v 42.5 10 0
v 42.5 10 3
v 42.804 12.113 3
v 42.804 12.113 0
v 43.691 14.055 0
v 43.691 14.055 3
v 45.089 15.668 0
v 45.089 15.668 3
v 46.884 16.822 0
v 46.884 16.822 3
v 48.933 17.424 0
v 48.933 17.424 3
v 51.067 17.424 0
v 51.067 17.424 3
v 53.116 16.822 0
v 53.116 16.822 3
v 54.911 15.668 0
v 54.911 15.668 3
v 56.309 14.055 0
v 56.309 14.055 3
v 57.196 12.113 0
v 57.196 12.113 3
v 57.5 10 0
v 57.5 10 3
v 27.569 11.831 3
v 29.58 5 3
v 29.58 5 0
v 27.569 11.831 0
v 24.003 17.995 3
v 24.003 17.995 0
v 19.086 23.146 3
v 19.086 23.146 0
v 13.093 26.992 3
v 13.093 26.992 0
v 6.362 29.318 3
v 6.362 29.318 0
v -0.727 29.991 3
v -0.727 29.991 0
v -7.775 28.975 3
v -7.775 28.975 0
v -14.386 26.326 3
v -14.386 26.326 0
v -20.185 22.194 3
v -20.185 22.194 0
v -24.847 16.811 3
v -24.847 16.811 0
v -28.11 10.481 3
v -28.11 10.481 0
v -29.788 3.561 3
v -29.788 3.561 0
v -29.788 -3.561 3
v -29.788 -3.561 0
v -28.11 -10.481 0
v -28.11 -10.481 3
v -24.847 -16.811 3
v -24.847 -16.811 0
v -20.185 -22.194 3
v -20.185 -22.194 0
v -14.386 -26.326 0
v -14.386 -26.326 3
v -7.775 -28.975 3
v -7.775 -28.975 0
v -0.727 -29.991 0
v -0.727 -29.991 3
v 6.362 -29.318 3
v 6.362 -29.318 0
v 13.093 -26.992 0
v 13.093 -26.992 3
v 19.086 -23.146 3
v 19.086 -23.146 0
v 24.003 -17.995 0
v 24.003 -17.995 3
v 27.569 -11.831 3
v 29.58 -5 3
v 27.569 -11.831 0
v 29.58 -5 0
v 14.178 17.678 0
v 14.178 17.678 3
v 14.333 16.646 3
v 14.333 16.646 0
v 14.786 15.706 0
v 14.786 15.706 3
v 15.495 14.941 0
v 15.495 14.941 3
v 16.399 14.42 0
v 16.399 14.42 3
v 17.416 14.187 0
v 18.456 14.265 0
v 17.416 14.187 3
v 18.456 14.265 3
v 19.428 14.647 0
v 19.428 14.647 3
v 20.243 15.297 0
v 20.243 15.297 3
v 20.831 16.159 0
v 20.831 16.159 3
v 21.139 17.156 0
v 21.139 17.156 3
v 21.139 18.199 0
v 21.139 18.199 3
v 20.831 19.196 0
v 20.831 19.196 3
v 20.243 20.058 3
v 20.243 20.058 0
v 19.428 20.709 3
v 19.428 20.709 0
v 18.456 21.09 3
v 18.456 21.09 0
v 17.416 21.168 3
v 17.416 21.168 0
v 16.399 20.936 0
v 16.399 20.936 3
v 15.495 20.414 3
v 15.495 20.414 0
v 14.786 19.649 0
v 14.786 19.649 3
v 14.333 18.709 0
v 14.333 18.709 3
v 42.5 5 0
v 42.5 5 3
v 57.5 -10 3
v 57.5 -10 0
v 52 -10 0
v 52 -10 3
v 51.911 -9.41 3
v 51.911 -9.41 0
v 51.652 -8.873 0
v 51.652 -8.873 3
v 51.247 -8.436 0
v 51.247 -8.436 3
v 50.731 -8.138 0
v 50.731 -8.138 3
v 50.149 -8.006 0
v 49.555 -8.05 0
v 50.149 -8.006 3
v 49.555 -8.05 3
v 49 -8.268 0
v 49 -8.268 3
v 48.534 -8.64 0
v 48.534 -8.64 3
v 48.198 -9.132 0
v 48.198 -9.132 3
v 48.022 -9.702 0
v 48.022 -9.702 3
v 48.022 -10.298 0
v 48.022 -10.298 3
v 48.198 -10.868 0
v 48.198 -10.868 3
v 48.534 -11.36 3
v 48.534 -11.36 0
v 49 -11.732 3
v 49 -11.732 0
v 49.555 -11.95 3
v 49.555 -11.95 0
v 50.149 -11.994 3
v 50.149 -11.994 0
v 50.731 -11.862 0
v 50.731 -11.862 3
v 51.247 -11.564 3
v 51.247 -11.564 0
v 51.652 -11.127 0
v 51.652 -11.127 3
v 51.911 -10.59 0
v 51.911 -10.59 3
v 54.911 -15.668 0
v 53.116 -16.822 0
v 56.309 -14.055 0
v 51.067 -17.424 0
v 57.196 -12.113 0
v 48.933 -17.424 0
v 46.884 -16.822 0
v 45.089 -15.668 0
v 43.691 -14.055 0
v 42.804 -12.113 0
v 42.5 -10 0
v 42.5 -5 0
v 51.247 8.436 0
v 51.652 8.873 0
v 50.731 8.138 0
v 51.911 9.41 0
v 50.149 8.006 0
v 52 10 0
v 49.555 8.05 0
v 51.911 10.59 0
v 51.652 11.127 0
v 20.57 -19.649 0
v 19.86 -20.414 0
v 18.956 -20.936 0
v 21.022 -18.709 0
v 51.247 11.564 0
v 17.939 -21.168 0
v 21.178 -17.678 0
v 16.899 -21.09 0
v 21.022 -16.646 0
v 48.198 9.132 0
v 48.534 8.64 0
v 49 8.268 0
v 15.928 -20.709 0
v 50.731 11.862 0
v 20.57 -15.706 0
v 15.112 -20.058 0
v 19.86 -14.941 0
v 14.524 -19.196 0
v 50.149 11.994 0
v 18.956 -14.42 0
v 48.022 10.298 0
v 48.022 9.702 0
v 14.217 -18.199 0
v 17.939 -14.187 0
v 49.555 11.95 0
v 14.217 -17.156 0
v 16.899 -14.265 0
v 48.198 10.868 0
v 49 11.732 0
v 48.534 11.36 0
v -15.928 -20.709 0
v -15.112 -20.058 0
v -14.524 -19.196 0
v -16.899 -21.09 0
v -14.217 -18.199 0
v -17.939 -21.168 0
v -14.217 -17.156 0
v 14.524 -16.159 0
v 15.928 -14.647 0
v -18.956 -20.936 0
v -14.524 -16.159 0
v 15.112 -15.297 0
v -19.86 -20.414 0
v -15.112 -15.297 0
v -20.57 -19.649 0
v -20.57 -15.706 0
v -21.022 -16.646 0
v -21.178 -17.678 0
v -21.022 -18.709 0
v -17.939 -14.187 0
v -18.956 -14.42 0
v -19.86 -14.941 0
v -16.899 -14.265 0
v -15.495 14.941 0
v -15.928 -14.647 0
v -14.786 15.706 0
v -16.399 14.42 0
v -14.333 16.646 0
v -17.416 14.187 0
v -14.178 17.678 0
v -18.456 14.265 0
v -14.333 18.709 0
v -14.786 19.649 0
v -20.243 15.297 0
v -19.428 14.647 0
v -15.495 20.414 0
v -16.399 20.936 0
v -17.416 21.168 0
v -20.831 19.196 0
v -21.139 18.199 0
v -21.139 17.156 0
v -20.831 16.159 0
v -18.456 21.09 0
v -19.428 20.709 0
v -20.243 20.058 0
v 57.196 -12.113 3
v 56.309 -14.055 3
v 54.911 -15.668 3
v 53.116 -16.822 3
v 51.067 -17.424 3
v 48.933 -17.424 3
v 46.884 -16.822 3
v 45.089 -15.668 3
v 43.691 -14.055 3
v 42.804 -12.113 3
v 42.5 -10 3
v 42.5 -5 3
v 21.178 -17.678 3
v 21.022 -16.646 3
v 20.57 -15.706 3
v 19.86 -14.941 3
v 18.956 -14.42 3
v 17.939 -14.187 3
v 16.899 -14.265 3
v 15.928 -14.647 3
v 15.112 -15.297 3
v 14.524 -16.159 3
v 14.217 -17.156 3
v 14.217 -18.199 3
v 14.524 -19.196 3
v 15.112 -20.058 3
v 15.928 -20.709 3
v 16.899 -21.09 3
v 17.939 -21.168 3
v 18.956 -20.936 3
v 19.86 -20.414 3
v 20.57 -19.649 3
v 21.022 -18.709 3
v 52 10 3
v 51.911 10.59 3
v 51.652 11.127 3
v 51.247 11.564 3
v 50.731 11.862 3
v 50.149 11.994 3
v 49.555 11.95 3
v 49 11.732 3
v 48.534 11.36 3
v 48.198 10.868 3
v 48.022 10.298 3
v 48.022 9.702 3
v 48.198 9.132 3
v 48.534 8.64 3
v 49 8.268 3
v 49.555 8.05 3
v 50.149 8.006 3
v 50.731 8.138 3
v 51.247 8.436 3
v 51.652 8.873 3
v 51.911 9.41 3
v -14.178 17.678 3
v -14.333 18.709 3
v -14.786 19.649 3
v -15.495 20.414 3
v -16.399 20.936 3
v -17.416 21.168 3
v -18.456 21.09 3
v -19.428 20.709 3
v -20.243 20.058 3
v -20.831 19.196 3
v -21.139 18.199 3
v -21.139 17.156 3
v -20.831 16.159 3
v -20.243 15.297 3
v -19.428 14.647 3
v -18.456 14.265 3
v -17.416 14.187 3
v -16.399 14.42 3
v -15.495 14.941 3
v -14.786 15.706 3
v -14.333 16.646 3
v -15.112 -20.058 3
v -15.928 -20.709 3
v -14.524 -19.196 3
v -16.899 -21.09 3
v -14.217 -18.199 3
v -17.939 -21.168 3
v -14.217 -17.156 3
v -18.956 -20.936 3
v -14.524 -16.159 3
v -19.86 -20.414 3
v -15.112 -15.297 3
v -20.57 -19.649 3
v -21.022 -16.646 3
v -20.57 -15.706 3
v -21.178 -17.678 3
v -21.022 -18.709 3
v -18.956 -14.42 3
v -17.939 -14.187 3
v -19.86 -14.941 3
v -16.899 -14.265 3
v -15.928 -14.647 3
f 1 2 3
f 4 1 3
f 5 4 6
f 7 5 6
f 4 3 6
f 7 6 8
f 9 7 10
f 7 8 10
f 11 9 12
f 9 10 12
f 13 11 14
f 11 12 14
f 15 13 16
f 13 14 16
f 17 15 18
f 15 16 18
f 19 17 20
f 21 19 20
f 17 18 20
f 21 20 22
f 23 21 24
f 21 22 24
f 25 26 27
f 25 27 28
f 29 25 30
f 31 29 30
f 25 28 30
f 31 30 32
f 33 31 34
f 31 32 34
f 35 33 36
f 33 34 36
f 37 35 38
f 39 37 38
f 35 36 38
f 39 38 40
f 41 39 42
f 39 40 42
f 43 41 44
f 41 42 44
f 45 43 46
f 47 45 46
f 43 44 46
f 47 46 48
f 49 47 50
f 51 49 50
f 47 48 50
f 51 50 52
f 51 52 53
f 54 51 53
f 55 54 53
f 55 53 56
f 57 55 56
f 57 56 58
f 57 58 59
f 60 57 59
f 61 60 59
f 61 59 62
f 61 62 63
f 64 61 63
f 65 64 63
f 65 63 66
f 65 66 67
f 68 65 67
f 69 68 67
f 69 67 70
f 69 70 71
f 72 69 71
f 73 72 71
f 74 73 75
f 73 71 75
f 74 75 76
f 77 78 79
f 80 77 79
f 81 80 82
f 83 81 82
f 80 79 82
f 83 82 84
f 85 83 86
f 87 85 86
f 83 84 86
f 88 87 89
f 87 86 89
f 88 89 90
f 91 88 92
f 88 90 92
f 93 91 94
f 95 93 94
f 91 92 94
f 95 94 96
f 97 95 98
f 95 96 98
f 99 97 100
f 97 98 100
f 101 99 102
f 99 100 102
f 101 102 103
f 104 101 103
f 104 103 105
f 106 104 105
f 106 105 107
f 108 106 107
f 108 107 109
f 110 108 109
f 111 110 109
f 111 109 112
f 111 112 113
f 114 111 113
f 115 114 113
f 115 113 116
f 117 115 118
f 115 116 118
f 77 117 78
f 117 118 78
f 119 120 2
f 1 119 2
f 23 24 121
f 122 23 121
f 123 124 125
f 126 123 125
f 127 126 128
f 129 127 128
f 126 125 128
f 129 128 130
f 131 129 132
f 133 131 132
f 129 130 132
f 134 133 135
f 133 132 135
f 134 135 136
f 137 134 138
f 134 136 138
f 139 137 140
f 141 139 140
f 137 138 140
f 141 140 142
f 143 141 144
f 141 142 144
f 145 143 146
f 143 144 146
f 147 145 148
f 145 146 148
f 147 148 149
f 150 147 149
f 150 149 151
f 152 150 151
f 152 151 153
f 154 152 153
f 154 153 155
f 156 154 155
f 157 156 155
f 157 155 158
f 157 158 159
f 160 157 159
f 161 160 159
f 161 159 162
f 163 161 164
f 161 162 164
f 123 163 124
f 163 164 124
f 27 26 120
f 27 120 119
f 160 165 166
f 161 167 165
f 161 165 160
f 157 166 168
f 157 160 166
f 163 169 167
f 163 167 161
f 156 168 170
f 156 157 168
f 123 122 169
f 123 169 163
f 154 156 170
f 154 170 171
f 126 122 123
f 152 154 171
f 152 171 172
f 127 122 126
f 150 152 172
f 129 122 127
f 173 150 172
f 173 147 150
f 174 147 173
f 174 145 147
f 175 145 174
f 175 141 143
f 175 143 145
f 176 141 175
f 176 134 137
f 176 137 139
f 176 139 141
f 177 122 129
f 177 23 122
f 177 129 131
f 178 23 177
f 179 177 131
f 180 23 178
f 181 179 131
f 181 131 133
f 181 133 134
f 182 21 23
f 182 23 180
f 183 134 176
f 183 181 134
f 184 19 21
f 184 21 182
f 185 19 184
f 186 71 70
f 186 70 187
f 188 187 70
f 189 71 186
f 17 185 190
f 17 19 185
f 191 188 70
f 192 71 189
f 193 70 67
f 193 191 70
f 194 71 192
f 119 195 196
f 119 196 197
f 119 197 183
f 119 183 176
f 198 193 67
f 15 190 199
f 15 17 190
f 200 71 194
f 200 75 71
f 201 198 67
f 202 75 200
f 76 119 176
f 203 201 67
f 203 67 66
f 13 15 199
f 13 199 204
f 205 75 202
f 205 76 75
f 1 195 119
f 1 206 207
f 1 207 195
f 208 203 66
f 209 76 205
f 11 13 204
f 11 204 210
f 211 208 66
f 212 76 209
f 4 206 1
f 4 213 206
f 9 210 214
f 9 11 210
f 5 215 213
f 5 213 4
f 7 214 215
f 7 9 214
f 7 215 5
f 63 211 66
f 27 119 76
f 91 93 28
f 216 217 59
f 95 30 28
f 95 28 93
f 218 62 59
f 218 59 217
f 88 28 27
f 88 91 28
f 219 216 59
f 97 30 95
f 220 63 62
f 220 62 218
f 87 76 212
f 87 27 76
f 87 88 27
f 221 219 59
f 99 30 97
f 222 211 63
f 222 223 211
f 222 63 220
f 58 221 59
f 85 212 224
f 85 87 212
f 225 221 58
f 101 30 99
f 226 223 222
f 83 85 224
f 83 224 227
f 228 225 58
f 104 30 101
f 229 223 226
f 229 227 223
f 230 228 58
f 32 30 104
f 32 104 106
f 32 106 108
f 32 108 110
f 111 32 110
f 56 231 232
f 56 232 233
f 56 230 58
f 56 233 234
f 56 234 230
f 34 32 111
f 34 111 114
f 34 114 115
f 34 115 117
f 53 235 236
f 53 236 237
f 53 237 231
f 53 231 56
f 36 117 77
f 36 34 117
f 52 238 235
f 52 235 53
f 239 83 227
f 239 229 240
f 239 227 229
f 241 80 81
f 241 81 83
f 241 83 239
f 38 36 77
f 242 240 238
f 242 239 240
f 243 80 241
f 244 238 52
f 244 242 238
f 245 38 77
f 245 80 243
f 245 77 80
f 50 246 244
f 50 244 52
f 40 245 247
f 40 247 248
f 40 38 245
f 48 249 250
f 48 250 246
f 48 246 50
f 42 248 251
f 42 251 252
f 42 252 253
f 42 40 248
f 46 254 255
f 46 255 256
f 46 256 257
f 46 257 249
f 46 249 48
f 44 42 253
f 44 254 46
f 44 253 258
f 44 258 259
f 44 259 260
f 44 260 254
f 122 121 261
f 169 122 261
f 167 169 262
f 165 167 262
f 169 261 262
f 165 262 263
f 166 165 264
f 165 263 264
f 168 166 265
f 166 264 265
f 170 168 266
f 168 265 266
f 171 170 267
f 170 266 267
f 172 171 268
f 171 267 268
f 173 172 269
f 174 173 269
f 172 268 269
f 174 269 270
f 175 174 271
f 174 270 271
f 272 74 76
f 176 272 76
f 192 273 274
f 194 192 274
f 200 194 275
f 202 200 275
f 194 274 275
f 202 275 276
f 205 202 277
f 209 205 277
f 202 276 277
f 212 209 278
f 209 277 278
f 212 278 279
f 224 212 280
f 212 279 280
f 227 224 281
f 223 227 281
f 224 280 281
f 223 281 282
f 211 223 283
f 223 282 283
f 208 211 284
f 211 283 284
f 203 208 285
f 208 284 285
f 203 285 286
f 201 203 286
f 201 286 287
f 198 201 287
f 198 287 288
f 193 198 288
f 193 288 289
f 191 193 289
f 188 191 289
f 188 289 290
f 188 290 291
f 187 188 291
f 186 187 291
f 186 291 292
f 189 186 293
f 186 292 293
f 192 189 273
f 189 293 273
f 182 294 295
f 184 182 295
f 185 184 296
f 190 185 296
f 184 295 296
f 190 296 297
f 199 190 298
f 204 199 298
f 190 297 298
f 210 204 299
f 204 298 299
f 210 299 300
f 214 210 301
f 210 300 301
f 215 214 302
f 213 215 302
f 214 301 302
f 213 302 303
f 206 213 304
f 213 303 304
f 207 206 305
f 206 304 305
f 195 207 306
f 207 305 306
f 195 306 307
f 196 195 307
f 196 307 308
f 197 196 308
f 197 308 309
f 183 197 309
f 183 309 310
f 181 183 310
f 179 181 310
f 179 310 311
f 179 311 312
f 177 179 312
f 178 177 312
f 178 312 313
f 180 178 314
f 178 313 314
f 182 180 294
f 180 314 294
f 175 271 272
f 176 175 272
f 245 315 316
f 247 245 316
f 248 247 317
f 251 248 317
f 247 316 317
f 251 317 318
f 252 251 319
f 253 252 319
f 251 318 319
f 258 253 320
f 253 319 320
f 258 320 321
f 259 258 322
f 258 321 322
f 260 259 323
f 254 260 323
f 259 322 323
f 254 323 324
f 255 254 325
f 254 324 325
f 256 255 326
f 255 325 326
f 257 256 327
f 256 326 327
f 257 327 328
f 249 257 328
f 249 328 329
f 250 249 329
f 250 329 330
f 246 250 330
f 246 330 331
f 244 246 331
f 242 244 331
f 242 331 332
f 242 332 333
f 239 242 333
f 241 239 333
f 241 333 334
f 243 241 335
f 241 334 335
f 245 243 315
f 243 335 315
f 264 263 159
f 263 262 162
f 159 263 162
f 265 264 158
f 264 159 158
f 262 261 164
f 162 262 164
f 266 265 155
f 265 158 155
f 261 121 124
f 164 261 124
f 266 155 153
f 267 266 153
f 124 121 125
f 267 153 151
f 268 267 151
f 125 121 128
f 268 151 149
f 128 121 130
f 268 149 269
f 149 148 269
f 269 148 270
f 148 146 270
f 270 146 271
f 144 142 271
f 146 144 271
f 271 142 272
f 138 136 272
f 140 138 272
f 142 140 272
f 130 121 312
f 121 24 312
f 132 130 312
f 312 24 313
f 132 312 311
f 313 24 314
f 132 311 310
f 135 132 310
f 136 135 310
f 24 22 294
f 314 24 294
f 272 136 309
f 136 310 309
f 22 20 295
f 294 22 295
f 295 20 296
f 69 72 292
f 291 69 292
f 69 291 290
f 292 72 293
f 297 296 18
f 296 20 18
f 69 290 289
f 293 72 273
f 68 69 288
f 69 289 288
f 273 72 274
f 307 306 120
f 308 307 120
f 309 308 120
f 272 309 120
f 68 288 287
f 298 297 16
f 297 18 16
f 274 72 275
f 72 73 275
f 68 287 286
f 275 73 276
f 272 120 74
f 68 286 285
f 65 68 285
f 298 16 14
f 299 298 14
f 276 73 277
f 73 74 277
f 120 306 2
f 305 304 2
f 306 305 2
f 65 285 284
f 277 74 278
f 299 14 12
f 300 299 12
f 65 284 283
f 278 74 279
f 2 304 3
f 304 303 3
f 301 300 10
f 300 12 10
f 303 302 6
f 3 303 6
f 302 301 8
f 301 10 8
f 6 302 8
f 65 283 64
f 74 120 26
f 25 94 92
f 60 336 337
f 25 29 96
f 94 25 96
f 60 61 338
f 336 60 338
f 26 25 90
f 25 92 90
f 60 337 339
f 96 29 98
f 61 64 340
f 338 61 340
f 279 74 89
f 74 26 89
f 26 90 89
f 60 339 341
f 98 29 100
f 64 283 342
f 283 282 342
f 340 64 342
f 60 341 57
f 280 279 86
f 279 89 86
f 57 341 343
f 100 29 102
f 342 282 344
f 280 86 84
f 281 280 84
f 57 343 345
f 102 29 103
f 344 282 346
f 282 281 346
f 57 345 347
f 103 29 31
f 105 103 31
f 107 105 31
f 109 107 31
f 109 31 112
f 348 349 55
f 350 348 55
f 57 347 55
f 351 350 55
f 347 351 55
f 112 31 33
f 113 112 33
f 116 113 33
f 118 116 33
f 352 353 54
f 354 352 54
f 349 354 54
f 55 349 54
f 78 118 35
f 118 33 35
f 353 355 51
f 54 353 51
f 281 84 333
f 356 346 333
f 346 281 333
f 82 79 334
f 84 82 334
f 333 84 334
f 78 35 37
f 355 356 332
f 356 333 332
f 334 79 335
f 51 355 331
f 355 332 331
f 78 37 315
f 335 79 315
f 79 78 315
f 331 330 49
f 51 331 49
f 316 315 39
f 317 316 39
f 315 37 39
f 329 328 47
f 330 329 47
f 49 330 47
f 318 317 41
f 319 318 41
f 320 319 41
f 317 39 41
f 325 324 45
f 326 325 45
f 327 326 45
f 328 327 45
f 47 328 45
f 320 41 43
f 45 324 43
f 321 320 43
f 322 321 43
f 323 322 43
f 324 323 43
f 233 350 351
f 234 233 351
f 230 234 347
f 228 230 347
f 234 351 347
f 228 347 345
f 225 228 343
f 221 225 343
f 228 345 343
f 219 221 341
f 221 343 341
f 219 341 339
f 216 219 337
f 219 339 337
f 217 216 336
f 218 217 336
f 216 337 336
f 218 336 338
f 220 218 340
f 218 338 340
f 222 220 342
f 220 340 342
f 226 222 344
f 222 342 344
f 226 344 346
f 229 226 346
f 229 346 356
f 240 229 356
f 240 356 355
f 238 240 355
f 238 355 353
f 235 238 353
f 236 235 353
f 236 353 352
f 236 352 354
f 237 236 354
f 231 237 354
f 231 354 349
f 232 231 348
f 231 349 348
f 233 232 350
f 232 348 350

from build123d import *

# Parameters (mm, degrees)
SKETCH_2_R          = 30
EXTRUDE_1_DEPTH     = 3
SKETCH_3_R          = 3.5
CUT_EXTRUDE_1_DEPTH = 3
SKETCH_4_W          = 3
SKETCH_4_H          = 10
EXTRUDE_2_DEPTH     = 50
EXTRUDE_3_DEPTH     = 3
SKETCH_7_R          = 2
CUT_EXTRUDE_2_DEPTH = 3


with BuildPart() as part:
    # 草图2 → 凸台-拉伸1 (new body)
    with BuildSketch(Plane.XY):
        Circle(SKETCH_2_R)
    extrude(amount=EXTRUDE_1_DEPTH)

    # 草图3 → 切除-拉伸1 (cut)
    with BuildSketch(Plane.XY.offset(3)):
        with Locations((-17.67766953, 17.67766953)):
            Circle(SKETCH_3_R)
        with Locations(Location((17.67766953, 17.67766953, 0), (0, 0, 180))):
            Circle(SKETCH_3_R)
        with Locations((17.67766953, -17.67766953)):
            Circle(SKETCH_3_R)
        with Locations(Location((-17.67766953, -17.67766953, 0), (0, 0, 180))):
            Circle(SKETCH_3_R)
    extrude(amount=-CUT_EXTRUDE_1_DEPTH, mode=Mode.SUBTRACT)

    # 草图4 → 凸台-拉伸2 (add)
    with BuildSketch(Plane(origin=(0, 0, 0), x_dir=(0, 0, -1), z_dir=(1, 0, 0))):
        with Locations((-1.5, 0)):
            Rectangle(SKETCH_4_W, SKETCH_4_H)
    extrude(amount=EXTRUDE_2_DEPTH)

    # 草图5 → 凸台-拉伸3 (add)
    with BuildSketch(Plane.XY.offset(3)):
        with BuildLine():
            Line((57.5, 10), (57.5, -10))
            ThreePointArc((57.5, -10), (50, -17.5), (42.5, -10))
            Line((42.5, -10), (42.5, 10))
            ThreePointArc((42.5, 10), (50, 17.5), (57.5, 10))
        make_face()
    extrude(amount=-EXTRUDE_3_DEPTH)

    # 草图7 → 切除-拉伸2 (cut)
    with BuildSketch(Plane.XY.offset(3)):
        with Locations((50, 10)):
            Circle(SKETCH_7_R)
        with Locations((50, -10)):
            Circle(SKETCH_7_R)
    extrude(amount=-CUT_EXTRUDE_2_DEPTH, mode=Mode.SUBTRACT)


solid = part.part
